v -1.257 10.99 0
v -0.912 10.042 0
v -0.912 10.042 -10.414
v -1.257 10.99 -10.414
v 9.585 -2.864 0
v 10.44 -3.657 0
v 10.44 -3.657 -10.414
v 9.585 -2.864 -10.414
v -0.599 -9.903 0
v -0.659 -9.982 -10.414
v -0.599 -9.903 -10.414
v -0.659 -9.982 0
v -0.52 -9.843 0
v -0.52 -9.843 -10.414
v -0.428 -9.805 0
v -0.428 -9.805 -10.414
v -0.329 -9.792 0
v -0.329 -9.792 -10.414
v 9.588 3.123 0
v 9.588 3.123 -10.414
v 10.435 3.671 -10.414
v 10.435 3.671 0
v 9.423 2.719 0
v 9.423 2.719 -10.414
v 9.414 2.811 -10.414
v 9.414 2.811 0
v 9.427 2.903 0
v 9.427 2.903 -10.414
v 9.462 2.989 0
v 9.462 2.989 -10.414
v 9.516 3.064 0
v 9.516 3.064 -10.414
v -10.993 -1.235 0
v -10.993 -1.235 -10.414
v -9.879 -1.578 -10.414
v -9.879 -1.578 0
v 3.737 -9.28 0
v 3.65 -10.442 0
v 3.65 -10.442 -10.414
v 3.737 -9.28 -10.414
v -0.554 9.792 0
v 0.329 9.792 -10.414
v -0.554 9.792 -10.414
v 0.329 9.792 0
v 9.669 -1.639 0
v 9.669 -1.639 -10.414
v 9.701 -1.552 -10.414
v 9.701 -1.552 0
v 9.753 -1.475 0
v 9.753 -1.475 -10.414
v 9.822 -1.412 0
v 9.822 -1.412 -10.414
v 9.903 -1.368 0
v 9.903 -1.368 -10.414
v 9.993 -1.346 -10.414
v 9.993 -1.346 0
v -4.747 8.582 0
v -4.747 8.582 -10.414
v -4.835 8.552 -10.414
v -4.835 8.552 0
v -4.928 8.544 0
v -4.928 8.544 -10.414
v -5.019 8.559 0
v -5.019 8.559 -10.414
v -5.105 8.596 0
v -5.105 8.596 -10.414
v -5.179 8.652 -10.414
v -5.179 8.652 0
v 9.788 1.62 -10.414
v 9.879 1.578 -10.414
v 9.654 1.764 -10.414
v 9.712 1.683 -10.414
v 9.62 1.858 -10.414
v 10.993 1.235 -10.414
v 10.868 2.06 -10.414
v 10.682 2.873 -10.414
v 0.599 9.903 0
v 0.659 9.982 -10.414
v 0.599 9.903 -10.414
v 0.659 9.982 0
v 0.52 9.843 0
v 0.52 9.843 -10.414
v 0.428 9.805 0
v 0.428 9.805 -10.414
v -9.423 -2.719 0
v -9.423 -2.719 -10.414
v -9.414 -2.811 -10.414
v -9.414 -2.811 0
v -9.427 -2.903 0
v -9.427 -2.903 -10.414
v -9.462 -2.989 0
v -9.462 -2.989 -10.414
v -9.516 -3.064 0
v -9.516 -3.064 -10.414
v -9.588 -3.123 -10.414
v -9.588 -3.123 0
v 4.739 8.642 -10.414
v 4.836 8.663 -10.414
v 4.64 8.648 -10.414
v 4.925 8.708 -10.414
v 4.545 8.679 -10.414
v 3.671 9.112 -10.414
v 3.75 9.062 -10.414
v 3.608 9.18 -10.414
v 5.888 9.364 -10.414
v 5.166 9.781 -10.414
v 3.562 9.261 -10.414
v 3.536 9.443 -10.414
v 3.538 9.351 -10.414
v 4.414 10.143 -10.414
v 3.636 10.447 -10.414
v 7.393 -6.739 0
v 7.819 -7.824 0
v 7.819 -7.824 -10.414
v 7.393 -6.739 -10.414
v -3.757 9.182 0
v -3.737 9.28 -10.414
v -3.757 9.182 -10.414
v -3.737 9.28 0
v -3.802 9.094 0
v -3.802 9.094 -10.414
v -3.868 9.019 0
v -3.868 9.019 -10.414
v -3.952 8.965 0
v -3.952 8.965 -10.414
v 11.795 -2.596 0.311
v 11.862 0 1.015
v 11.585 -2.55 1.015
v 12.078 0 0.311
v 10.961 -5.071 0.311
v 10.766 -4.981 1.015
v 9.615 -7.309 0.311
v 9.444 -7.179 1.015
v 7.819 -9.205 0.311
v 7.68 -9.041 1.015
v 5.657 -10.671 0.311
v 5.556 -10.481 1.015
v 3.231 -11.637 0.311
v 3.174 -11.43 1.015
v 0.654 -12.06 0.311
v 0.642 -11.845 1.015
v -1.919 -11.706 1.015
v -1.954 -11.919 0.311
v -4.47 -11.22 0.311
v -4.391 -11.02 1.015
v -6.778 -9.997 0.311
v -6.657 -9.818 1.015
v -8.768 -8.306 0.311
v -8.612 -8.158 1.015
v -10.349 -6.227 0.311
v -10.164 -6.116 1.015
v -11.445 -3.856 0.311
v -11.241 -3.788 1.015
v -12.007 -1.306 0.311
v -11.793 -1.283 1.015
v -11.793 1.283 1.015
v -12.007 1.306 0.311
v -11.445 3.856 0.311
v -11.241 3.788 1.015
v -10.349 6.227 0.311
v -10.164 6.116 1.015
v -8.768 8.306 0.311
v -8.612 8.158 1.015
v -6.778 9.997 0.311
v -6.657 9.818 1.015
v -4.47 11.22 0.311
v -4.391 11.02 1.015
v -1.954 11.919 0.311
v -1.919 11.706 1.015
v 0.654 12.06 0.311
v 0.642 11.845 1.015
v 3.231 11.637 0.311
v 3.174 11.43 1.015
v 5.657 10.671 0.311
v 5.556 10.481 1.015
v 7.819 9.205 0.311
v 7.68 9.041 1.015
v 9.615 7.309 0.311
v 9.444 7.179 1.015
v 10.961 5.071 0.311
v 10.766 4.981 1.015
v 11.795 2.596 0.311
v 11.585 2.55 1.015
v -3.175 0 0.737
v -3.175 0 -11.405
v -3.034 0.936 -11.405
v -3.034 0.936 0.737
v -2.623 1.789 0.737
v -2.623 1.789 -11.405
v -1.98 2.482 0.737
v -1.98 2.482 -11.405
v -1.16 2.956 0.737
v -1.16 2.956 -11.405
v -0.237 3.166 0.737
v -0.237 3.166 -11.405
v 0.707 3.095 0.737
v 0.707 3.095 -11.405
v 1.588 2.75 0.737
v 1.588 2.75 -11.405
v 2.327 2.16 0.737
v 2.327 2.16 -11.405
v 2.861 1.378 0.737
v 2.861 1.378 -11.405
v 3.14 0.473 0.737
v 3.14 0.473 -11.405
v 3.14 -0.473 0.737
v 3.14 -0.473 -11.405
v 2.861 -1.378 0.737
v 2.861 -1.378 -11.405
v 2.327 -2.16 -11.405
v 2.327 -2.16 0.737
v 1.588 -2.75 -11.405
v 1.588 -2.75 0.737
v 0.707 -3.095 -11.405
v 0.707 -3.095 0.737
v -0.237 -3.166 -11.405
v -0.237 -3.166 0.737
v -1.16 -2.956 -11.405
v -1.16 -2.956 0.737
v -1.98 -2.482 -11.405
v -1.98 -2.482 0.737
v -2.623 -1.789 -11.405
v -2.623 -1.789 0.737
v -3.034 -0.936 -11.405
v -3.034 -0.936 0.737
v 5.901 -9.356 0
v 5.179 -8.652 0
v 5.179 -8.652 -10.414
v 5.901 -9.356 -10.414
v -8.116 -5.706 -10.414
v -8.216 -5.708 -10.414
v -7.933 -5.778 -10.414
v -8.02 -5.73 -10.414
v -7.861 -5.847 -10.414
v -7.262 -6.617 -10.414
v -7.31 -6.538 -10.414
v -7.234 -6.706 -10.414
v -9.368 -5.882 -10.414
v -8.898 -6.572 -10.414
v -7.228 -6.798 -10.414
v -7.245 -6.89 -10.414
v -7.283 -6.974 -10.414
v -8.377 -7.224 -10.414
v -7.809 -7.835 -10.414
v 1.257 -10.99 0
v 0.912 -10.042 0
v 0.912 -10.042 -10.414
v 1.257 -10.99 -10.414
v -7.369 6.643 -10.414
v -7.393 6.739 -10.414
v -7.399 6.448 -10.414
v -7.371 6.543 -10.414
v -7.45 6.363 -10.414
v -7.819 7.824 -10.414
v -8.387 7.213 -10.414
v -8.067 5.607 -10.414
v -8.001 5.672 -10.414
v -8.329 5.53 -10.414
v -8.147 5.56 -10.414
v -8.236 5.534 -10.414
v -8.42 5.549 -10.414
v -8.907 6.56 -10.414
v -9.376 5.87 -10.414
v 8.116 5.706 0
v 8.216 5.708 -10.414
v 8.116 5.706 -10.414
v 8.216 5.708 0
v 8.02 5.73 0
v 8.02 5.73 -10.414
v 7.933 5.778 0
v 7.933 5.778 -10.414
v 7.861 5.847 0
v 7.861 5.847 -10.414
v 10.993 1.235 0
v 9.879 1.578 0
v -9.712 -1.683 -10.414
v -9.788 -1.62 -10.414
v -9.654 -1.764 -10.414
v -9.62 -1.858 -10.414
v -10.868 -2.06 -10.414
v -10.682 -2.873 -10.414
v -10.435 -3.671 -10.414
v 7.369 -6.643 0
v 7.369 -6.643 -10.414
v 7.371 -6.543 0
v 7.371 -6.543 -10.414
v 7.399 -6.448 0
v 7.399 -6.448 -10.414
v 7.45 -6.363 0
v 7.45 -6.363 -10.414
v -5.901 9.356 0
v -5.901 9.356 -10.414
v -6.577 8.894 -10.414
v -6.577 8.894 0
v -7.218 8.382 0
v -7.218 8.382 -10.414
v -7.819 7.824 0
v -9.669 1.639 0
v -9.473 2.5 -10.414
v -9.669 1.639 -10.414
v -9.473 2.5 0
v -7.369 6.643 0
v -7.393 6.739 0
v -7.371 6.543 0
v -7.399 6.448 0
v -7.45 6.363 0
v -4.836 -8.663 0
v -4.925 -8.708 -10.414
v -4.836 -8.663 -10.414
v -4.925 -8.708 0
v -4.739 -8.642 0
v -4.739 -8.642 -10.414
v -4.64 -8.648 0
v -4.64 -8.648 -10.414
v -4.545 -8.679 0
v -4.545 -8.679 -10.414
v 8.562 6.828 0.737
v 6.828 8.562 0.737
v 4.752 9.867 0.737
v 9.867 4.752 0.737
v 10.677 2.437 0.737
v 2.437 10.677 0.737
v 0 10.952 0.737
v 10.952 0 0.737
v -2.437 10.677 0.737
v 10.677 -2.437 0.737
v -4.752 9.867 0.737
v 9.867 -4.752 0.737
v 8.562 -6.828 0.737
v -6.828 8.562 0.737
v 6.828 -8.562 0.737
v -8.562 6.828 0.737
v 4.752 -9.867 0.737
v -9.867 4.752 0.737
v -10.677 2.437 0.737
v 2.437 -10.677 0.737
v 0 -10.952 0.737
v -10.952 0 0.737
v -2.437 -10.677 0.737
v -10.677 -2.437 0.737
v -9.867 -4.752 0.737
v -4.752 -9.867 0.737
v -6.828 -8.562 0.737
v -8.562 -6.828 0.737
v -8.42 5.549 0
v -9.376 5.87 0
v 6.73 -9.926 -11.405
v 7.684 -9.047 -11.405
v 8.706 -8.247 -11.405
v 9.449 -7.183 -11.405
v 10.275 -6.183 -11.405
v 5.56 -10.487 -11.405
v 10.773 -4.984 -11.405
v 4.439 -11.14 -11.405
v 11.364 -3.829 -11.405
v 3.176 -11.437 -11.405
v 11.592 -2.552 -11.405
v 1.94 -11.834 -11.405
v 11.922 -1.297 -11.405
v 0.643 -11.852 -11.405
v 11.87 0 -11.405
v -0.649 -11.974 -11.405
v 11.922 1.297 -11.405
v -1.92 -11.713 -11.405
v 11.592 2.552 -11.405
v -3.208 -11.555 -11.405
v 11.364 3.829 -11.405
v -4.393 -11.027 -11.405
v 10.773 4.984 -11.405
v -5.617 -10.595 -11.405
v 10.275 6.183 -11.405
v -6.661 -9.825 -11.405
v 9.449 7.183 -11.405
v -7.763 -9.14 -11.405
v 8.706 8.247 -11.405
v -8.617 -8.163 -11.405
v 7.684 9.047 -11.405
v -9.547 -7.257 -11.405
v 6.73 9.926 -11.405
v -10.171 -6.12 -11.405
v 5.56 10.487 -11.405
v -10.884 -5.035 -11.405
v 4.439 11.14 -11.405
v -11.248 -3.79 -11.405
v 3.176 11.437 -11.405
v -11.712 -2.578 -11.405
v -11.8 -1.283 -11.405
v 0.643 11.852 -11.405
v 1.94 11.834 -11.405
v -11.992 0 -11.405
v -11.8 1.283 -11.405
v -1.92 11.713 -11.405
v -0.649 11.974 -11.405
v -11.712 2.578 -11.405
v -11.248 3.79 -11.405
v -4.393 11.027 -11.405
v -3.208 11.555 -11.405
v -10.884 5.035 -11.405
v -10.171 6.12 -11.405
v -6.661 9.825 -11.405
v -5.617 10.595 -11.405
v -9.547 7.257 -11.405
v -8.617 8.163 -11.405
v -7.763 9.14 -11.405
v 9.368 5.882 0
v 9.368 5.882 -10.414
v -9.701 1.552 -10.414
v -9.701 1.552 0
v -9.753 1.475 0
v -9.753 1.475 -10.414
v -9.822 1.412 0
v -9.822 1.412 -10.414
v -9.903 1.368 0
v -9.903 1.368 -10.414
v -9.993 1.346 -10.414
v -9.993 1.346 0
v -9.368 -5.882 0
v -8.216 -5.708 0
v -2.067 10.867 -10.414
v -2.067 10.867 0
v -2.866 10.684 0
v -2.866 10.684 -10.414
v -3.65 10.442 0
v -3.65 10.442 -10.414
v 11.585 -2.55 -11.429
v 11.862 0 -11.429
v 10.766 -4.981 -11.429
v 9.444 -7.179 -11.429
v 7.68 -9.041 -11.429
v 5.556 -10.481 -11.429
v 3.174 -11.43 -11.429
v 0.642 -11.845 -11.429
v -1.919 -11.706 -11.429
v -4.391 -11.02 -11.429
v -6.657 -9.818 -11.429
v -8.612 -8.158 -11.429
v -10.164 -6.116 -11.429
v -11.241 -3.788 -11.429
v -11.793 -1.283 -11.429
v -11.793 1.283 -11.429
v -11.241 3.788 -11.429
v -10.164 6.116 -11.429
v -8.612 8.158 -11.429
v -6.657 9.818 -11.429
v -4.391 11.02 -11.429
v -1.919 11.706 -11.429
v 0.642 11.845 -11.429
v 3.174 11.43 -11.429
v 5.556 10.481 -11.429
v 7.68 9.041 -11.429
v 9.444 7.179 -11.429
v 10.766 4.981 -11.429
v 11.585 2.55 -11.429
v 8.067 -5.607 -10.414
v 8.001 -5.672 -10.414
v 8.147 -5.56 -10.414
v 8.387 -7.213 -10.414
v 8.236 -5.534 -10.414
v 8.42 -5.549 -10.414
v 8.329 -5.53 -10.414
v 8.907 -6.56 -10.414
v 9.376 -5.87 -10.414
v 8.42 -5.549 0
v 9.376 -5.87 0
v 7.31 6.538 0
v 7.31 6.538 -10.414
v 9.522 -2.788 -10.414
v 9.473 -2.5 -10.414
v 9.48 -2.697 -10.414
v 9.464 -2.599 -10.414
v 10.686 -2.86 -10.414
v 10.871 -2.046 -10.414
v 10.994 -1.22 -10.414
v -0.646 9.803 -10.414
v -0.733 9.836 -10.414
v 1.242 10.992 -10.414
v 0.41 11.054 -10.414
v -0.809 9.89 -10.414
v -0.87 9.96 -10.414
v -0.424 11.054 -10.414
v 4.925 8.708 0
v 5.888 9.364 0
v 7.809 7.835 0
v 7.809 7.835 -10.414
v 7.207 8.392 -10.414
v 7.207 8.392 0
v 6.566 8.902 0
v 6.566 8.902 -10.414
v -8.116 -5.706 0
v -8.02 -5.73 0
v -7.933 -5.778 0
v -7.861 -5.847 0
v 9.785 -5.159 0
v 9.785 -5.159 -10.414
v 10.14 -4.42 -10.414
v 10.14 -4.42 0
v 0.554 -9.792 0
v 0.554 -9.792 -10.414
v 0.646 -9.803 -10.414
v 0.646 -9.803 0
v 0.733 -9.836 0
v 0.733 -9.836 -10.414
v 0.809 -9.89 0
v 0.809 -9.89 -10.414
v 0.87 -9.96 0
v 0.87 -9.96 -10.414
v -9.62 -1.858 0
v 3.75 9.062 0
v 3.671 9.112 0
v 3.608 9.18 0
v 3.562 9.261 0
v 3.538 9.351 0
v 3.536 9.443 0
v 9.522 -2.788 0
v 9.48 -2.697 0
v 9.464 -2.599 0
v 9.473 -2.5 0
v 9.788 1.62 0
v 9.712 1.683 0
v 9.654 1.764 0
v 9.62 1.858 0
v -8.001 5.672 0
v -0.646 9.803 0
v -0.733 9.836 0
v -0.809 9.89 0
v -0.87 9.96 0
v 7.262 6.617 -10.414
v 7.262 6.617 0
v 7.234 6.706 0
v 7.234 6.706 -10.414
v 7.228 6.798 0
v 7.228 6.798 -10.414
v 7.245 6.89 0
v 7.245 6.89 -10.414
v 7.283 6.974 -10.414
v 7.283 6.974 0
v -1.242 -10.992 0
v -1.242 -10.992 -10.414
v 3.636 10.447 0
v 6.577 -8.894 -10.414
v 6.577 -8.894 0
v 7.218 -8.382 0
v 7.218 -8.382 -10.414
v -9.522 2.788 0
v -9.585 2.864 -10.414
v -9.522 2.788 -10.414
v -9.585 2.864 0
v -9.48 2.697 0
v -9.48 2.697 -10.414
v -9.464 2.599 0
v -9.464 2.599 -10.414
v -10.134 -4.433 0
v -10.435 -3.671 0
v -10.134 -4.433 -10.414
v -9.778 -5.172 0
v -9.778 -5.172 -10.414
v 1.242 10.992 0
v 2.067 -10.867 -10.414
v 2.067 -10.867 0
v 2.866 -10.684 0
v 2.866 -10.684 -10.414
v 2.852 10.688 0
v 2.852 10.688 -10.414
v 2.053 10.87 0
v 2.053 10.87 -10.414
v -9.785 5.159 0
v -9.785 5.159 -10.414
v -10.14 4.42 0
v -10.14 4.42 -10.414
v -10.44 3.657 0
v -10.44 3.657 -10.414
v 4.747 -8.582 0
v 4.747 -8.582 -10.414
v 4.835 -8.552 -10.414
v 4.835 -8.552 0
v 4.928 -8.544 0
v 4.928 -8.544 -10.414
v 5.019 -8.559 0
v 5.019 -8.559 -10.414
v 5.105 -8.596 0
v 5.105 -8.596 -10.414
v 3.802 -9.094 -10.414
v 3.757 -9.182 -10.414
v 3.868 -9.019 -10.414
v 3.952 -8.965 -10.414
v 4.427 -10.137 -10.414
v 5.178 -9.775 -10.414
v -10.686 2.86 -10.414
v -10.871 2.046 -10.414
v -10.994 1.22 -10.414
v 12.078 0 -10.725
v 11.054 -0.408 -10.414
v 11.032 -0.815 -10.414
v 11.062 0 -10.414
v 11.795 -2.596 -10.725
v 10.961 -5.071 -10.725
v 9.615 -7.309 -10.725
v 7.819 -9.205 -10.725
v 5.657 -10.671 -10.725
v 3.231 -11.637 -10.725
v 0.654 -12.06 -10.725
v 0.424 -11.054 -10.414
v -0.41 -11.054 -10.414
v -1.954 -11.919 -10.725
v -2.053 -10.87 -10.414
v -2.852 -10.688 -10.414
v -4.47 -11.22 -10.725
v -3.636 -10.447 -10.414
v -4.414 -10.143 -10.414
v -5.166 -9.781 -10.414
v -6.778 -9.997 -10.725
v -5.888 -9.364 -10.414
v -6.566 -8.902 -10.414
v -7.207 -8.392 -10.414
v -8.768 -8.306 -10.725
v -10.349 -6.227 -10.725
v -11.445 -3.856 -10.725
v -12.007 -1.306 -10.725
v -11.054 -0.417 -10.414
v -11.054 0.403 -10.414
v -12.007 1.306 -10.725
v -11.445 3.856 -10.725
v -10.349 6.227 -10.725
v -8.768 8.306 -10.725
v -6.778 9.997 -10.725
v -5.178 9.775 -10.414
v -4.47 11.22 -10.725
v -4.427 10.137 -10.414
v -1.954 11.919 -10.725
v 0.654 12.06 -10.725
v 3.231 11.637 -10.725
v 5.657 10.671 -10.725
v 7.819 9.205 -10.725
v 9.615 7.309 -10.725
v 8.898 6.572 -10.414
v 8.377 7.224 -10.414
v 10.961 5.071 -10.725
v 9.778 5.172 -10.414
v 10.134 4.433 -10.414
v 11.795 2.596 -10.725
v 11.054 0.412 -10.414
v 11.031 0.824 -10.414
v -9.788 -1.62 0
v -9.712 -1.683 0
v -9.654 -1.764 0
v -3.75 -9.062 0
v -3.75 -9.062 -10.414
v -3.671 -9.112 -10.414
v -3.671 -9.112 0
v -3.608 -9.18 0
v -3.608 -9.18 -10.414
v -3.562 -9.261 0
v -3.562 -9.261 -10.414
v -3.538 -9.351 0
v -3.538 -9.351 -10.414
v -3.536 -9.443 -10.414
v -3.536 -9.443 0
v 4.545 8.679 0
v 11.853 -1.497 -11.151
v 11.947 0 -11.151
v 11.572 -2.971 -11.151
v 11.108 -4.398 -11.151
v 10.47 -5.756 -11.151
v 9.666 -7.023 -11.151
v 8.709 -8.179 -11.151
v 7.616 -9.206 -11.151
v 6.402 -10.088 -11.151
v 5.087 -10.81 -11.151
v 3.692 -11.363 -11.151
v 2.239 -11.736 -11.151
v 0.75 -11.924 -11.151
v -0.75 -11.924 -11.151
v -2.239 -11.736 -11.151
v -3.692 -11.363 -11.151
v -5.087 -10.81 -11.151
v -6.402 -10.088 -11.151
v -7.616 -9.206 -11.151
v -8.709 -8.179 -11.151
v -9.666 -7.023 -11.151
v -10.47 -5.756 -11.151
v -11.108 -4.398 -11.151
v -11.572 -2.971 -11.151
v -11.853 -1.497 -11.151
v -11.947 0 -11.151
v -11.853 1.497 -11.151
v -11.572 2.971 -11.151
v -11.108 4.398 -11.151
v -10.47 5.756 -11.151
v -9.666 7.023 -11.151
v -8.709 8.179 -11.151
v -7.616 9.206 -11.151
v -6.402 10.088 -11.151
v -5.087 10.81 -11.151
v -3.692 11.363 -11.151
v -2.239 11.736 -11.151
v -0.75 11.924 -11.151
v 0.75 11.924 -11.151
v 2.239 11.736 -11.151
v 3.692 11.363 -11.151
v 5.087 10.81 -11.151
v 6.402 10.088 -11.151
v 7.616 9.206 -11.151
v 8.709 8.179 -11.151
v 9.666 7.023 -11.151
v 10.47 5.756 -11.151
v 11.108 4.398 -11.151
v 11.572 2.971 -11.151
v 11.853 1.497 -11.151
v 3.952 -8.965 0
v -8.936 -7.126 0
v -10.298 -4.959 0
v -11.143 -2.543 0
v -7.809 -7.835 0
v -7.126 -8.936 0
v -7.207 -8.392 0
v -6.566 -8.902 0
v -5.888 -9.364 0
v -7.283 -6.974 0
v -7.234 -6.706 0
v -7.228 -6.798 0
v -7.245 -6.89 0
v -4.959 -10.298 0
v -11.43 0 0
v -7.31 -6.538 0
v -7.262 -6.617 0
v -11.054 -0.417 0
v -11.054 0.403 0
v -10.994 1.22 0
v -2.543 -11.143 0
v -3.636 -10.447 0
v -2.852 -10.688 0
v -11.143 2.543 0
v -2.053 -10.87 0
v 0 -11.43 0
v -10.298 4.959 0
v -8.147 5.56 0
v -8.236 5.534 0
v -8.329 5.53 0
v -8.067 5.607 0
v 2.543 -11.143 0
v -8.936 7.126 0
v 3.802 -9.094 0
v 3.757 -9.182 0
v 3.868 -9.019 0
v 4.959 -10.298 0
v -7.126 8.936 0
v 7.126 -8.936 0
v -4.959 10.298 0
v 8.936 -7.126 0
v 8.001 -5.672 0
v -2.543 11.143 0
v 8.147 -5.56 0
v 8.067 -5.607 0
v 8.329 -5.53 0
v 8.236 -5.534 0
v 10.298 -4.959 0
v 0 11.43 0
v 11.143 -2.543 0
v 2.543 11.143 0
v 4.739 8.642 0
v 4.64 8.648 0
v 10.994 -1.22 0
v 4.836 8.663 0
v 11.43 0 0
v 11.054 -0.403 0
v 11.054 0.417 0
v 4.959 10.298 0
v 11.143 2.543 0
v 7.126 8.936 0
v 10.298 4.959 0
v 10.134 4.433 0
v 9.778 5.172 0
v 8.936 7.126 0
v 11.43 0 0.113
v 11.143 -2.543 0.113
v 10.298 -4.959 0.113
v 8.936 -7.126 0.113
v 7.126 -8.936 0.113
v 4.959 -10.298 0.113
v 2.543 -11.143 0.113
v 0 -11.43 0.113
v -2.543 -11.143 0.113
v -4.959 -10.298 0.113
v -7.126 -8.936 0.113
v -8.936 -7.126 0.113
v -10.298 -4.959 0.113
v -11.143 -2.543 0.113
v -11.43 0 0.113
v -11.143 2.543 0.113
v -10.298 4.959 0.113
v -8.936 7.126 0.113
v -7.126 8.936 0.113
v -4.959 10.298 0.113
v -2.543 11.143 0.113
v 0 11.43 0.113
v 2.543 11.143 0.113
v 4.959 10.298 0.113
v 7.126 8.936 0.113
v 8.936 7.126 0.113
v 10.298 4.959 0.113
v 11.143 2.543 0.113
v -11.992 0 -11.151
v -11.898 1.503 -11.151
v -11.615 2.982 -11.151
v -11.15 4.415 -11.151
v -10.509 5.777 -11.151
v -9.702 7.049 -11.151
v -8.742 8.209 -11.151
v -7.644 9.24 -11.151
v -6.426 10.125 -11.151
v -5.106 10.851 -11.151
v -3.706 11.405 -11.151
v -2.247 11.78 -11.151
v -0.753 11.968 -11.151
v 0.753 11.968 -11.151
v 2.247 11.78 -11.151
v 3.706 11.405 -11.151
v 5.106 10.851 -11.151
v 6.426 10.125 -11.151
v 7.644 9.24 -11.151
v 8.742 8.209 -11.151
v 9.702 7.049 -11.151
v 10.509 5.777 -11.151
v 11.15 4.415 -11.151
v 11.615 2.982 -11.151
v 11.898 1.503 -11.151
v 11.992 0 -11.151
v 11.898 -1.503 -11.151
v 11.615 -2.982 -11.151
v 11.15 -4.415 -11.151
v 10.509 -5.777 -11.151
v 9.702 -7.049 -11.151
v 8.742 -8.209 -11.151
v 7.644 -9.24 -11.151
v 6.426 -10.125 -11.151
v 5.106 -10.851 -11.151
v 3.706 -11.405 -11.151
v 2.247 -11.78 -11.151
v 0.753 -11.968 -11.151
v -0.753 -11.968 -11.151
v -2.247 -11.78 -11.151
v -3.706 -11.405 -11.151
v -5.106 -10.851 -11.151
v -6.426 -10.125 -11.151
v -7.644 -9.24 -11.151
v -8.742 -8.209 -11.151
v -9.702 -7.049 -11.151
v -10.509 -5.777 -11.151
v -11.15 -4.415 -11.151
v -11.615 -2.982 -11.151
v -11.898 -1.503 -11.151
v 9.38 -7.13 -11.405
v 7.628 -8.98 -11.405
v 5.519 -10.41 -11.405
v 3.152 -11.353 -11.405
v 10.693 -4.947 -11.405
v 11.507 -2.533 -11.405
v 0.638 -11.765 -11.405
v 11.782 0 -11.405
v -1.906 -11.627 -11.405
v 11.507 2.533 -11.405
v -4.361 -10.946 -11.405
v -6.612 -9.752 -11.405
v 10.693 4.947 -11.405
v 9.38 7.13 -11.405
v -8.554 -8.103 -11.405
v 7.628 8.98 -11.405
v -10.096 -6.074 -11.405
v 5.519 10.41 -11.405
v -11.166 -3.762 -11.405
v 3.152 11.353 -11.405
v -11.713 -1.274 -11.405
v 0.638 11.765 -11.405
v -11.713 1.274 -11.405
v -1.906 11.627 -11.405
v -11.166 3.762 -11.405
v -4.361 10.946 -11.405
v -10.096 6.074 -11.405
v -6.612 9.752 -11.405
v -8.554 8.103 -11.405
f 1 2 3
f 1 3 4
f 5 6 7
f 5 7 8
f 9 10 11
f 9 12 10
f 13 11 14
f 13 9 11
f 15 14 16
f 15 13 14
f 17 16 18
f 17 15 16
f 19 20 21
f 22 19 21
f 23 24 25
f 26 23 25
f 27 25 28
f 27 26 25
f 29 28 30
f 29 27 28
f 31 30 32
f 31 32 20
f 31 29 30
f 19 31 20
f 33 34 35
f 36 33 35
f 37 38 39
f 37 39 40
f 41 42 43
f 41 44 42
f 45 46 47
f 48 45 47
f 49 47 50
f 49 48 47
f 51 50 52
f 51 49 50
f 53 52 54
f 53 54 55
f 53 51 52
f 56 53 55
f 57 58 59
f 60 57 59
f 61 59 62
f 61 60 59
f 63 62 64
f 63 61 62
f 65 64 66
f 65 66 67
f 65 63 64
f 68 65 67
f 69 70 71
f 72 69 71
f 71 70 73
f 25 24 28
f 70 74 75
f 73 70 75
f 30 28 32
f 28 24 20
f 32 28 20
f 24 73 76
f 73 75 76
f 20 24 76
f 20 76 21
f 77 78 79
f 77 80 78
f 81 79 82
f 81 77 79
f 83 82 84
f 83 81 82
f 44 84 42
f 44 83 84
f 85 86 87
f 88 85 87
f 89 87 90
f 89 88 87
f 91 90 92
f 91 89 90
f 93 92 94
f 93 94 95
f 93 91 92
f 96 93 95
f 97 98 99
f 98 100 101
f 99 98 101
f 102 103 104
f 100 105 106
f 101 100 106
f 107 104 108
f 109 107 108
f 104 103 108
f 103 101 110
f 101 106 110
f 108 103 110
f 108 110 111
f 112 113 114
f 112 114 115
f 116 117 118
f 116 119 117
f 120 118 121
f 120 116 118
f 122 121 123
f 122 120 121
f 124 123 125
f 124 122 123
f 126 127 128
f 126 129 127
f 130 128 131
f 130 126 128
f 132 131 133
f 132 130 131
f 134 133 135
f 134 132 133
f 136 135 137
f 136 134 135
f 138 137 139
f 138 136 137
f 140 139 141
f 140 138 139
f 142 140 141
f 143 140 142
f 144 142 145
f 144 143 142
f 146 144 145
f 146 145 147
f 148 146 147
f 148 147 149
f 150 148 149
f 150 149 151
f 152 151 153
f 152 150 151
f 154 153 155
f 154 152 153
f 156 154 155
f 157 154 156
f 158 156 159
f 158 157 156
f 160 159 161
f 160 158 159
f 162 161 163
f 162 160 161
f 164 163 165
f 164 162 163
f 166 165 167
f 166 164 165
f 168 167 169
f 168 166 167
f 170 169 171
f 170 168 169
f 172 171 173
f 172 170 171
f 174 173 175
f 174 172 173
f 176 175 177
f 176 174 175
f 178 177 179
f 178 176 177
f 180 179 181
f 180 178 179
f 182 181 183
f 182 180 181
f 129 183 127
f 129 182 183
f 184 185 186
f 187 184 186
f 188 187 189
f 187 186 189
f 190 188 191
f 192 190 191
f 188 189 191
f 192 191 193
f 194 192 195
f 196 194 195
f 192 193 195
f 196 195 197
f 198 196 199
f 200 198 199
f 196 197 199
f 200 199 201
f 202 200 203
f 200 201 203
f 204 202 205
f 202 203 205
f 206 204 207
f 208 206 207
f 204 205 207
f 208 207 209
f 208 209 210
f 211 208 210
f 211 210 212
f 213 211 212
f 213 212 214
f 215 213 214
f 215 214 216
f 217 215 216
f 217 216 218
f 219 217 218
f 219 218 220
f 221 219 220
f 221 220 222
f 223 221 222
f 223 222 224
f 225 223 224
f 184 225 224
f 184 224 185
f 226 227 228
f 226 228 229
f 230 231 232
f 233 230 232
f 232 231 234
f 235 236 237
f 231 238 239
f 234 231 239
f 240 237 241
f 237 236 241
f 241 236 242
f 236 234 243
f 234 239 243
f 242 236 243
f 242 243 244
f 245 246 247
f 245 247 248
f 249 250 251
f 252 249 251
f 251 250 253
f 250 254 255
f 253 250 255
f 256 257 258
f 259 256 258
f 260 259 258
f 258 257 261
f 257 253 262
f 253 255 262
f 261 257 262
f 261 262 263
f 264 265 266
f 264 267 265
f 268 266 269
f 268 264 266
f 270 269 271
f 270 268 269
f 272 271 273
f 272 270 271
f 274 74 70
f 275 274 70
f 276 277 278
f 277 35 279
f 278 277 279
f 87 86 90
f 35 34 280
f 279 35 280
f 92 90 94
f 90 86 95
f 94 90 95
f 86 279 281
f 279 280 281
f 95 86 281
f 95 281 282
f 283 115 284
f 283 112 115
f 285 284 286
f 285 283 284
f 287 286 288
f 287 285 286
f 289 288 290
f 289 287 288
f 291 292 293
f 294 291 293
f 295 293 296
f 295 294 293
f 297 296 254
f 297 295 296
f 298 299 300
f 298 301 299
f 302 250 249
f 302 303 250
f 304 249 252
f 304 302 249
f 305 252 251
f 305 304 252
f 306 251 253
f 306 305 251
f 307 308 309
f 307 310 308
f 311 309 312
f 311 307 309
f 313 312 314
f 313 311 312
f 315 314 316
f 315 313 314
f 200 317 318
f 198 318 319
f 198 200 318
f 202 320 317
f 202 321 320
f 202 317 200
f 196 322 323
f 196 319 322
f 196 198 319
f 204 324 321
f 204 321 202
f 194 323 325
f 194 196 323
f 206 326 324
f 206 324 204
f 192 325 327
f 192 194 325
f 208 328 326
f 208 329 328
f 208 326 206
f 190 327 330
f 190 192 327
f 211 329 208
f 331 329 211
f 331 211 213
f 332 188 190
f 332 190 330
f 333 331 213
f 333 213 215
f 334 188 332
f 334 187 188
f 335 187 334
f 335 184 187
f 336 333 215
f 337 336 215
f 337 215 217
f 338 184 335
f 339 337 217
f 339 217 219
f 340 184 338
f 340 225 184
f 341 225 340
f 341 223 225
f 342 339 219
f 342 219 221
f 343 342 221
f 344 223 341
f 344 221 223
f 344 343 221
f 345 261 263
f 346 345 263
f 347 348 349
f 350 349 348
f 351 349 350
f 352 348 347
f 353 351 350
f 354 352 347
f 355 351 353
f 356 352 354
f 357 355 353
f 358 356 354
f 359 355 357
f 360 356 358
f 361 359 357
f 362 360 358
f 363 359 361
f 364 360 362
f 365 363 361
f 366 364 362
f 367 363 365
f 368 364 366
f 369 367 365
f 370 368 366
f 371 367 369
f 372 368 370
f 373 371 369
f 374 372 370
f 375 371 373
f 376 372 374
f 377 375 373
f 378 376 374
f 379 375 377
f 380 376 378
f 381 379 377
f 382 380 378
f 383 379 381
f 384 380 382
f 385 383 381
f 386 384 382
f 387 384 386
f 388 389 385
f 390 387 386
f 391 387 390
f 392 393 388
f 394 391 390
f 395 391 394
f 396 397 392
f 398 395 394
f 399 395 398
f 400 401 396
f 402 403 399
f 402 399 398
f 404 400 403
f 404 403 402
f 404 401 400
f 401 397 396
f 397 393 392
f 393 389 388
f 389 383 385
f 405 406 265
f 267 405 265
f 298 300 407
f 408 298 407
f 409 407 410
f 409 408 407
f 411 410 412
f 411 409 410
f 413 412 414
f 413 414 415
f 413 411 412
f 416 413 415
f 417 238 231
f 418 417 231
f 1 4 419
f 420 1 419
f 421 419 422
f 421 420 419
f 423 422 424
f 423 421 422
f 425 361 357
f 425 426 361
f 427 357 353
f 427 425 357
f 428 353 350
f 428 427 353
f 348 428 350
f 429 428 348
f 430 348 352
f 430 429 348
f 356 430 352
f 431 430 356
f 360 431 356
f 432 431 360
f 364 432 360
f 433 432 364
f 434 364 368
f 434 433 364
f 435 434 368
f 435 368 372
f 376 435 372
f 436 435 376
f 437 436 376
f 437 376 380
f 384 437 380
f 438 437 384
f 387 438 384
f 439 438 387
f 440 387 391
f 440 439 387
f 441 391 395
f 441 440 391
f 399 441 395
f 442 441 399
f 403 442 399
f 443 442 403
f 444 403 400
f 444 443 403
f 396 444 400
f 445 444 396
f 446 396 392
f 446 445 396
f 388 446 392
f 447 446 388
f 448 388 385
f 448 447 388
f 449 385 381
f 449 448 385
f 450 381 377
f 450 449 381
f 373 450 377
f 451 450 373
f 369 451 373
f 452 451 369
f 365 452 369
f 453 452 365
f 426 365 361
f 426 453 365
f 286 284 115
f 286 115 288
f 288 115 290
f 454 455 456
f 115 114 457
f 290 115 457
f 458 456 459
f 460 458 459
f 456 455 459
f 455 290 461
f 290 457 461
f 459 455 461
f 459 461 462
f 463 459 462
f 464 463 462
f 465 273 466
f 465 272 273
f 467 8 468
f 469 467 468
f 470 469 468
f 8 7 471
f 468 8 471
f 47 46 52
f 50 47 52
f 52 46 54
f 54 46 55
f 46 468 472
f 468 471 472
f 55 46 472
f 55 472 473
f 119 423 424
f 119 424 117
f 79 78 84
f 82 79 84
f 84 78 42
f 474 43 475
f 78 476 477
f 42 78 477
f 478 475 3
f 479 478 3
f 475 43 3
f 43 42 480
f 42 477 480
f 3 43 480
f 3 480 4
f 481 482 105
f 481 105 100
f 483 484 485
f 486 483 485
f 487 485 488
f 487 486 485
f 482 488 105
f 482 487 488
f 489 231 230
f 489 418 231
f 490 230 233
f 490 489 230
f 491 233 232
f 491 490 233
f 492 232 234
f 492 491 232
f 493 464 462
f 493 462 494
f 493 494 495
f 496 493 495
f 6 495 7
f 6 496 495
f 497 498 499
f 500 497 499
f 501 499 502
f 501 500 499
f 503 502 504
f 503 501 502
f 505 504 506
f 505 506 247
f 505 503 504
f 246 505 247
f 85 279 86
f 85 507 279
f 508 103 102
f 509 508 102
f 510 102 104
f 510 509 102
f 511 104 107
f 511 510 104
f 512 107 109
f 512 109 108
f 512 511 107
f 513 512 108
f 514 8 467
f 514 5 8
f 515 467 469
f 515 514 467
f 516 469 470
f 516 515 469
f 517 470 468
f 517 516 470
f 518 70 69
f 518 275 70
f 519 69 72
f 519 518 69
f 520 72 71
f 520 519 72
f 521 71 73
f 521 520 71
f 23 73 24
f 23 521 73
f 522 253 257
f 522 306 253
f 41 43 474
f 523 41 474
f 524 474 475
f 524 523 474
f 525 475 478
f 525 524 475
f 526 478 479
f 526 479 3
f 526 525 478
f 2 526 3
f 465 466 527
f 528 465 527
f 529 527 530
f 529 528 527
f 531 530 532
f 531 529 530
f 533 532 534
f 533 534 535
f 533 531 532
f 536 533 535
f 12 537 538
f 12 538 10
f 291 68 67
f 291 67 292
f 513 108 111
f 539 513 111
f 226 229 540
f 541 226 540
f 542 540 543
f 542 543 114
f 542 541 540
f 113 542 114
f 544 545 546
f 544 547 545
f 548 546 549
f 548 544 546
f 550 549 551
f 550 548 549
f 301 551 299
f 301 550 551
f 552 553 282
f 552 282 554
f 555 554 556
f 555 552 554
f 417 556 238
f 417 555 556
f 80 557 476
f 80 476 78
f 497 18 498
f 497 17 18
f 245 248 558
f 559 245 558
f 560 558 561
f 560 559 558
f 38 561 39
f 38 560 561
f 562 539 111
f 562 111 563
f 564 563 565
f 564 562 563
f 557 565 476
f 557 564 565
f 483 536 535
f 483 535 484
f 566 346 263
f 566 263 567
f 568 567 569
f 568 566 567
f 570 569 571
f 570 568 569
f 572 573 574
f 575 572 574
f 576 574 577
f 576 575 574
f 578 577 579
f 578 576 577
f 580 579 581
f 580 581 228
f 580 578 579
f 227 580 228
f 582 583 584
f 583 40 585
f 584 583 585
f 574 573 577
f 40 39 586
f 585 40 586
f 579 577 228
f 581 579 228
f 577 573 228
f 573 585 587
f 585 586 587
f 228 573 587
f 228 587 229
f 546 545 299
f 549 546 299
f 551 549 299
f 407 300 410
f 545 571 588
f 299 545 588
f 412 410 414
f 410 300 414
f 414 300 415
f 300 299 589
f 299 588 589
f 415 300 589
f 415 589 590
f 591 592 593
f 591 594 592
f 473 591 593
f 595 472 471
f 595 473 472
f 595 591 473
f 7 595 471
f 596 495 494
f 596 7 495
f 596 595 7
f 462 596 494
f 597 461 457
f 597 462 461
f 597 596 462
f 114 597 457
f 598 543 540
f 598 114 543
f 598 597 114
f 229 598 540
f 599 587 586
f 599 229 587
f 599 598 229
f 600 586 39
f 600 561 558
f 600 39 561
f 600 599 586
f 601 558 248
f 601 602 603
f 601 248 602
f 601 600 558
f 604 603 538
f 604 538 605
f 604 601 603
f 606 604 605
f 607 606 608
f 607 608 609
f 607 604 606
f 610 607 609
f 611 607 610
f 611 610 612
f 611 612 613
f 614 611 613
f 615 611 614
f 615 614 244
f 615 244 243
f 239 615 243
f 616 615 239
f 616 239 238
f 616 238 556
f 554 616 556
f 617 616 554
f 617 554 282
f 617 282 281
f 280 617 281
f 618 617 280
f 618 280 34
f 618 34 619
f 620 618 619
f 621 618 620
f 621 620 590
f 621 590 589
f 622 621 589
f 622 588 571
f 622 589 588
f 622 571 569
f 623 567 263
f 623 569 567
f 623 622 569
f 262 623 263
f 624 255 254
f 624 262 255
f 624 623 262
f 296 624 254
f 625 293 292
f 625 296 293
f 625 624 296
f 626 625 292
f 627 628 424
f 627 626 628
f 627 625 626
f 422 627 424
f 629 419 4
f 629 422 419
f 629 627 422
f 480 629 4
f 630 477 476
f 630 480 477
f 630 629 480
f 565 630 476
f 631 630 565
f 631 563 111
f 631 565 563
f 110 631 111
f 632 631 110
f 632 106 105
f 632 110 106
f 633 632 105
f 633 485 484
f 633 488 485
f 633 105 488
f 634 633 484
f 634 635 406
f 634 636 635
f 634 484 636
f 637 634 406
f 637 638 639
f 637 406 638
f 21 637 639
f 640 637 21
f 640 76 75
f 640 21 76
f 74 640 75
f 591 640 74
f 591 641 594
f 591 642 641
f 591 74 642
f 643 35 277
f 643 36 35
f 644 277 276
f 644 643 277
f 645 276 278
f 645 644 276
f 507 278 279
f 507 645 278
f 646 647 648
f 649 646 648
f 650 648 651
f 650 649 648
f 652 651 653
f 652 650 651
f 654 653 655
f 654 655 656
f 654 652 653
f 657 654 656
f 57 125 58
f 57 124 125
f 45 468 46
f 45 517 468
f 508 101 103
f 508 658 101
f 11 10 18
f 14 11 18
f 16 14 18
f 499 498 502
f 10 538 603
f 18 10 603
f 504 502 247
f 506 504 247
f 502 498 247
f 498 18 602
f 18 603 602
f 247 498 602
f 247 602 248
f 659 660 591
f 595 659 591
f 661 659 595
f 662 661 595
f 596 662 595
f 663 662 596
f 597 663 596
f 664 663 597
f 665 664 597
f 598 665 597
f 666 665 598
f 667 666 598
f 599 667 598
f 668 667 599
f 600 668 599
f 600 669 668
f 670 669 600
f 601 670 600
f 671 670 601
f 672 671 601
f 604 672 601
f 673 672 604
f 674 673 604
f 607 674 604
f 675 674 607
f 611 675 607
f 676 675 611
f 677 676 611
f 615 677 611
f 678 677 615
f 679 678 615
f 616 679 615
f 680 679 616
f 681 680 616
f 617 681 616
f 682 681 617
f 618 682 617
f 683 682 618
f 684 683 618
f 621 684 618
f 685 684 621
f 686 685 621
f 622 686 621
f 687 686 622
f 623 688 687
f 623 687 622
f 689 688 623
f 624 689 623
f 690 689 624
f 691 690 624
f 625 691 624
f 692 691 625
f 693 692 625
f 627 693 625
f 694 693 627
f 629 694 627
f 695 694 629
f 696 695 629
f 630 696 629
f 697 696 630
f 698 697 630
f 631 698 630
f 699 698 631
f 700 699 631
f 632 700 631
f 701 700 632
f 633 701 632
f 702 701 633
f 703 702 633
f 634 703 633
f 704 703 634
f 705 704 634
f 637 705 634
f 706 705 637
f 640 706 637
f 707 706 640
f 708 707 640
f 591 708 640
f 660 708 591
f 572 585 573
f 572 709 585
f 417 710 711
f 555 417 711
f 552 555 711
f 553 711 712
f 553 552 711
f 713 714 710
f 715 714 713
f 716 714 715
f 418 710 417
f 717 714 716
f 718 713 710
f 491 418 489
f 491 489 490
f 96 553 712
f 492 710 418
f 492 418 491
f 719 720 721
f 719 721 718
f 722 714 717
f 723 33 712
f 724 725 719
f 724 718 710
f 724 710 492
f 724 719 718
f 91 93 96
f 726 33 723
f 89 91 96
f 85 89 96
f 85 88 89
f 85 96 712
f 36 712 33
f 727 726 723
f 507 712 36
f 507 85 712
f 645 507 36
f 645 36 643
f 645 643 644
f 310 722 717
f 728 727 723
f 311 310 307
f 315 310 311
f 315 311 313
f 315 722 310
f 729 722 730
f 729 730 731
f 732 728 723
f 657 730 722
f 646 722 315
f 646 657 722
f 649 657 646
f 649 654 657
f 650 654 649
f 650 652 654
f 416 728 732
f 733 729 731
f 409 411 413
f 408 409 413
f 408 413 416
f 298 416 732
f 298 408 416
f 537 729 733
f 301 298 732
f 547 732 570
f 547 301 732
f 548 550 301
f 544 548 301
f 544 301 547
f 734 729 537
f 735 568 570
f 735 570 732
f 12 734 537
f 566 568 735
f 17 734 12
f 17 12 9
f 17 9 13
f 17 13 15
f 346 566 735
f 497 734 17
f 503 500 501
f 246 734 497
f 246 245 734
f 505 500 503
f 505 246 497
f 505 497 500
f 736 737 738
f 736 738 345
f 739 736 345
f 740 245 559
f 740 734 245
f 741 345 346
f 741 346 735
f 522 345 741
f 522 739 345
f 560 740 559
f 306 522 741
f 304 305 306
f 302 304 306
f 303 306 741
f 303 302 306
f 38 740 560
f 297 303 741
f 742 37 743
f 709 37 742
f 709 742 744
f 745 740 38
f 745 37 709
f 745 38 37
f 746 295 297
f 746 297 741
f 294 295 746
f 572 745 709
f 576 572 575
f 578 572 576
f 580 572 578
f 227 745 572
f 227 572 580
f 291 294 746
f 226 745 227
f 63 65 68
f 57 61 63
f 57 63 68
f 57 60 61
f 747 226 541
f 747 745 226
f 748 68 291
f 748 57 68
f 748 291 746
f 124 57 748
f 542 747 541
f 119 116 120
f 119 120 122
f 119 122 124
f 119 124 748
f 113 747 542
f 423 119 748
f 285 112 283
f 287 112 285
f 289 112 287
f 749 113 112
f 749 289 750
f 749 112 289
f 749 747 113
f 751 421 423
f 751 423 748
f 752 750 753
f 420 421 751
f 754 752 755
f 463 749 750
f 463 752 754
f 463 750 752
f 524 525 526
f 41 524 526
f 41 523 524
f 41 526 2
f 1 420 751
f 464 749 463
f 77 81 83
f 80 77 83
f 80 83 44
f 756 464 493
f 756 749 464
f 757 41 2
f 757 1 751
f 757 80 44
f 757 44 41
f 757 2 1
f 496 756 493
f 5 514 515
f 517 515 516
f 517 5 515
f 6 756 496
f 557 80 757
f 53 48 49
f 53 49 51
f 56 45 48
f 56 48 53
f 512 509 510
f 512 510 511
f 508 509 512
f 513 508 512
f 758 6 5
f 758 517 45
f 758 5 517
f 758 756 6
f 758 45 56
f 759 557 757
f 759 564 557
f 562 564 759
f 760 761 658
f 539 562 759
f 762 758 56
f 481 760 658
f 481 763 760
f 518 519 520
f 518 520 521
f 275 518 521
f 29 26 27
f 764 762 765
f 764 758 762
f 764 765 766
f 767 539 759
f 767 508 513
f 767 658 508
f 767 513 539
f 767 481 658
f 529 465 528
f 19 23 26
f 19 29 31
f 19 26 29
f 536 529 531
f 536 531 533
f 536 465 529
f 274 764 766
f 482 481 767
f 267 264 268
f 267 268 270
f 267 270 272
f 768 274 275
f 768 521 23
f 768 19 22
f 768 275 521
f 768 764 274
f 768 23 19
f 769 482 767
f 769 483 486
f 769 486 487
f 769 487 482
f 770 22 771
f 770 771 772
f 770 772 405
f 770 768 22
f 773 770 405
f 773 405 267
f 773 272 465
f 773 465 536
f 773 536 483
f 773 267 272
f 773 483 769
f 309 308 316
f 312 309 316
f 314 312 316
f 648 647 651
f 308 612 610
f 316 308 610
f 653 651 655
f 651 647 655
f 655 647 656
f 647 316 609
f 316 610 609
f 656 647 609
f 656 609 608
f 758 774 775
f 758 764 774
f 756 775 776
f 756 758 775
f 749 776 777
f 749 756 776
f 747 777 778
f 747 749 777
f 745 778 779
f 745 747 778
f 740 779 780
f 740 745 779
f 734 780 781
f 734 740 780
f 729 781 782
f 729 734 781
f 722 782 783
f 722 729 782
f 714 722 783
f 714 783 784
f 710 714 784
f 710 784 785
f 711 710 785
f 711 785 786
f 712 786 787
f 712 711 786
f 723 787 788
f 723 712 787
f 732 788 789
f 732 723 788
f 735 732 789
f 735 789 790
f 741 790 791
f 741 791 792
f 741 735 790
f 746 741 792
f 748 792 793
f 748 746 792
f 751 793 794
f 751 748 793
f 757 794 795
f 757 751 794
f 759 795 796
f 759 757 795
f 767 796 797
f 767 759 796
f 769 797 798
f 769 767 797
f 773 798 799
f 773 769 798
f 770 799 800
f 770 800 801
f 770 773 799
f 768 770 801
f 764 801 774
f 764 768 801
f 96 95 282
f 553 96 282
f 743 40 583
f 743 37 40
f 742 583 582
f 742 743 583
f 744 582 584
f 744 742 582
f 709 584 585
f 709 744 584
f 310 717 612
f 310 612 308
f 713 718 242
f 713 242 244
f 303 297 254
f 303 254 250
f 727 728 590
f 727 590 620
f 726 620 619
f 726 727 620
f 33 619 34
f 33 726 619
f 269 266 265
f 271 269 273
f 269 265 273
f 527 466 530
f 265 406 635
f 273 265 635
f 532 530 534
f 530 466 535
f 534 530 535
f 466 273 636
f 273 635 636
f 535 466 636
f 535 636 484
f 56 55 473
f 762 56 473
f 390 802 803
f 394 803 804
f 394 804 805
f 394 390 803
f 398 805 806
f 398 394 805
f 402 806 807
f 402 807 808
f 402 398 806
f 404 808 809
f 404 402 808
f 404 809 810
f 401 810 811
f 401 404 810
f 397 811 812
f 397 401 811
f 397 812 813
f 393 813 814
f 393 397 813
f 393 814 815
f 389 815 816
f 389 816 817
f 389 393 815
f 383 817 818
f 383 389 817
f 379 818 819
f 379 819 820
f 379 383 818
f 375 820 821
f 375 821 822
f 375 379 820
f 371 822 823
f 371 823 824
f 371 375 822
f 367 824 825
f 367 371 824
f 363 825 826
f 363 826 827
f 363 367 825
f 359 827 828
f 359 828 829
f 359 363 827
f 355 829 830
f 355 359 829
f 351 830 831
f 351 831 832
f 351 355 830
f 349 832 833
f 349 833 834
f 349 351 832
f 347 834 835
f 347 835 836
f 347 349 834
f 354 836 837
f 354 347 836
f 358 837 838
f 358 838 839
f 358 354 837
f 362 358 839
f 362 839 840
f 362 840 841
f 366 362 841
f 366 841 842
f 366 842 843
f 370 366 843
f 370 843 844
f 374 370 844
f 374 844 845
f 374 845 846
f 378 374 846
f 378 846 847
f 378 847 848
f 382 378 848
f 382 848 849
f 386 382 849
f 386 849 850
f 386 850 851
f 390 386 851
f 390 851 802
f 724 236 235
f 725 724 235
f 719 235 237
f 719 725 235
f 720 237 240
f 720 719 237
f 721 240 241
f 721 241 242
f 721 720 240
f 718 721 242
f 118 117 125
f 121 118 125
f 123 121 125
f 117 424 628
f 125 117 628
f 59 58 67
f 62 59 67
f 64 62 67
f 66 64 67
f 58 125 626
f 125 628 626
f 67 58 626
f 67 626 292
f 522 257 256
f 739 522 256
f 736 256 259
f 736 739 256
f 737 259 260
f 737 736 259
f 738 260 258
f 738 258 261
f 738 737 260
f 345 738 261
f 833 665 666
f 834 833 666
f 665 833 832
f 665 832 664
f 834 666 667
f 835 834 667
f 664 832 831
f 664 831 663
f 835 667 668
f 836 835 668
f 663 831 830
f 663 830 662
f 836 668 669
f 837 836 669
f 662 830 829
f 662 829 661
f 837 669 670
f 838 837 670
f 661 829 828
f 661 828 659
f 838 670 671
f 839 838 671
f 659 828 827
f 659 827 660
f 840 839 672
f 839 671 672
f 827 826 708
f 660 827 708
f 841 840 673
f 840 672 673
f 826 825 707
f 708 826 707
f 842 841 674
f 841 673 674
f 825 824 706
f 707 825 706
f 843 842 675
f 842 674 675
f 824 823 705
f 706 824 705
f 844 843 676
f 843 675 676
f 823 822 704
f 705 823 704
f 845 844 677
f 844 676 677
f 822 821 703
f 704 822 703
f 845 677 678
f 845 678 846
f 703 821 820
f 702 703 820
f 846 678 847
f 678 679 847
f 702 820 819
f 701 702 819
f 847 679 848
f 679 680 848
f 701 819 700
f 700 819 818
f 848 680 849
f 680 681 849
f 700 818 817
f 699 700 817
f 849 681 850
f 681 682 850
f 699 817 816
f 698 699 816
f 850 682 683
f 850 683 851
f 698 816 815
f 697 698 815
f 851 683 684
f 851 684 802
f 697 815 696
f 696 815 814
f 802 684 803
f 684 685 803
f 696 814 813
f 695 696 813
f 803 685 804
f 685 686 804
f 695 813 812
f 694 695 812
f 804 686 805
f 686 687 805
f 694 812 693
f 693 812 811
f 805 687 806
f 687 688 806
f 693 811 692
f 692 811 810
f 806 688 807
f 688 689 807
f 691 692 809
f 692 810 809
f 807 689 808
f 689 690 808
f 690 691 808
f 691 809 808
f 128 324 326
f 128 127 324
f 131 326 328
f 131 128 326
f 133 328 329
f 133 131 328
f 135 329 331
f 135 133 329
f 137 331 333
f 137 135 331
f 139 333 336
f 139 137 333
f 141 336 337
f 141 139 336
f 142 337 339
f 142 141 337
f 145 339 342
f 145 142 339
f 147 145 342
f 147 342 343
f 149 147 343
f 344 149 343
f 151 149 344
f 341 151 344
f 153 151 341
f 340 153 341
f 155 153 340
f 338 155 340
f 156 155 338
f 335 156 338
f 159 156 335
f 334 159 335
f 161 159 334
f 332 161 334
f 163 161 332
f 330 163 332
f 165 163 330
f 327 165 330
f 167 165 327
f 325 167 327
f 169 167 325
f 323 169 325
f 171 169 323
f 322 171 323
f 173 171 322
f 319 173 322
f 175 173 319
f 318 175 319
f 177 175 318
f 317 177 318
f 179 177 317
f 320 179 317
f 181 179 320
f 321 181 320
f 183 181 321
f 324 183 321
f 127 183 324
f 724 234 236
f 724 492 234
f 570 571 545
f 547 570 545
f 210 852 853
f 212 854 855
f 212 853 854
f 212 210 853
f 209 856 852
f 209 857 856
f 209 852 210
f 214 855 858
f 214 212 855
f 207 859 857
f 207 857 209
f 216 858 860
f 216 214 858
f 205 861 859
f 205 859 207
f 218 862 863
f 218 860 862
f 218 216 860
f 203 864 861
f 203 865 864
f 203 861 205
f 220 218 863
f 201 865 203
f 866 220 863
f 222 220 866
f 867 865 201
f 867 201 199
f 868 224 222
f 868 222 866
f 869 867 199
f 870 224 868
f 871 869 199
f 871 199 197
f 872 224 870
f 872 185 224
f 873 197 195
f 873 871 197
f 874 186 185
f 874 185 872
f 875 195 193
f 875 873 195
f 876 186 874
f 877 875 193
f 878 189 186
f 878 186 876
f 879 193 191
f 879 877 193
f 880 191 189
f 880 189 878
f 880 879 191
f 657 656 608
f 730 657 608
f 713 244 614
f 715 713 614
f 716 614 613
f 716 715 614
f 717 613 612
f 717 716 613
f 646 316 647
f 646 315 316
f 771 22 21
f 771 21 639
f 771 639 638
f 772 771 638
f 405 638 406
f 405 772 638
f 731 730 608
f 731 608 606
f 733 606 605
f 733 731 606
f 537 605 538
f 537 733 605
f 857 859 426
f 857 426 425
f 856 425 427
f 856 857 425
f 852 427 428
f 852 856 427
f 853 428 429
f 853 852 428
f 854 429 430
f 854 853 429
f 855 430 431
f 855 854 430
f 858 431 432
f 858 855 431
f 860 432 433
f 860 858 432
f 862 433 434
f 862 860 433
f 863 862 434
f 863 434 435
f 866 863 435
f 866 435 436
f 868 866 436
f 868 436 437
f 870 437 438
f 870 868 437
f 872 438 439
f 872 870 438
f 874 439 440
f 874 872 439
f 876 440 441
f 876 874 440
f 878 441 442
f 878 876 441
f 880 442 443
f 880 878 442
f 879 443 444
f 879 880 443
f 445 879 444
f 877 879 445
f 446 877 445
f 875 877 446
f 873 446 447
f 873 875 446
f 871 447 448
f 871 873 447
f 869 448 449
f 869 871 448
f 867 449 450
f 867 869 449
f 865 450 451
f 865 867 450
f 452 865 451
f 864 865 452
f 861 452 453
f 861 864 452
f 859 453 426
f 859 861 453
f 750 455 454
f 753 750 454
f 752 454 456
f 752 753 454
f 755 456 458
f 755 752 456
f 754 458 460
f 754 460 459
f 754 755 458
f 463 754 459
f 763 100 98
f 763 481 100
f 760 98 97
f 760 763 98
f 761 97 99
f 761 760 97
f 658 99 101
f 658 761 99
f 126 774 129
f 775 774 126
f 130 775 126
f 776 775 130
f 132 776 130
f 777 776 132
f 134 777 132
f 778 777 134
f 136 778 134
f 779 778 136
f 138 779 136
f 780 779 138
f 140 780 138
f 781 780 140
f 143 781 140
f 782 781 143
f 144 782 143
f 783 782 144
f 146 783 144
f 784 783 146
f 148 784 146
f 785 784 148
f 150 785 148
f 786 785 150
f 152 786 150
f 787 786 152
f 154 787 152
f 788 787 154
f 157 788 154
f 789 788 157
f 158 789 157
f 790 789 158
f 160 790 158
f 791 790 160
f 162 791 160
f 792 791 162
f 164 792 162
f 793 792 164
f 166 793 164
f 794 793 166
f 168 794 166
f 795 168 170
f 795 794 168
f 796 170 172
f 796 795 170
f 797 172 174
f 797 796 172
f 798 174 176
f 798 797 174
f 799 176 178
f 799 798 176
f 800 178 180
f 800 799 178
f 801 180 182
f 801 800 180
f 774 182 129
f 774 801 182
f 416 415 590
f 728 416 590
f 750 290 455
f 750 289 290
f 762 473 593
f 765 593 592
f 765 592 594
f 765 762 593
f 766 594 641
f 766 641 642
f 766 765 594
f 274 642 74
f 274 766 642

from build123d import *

# Parameters (mm, degrees)
SKETCH1_R           = 11.0617
BASEPULLEY_DEPTH    = 10.414
GROOVE_DEPTH        = 5.207
GROOVES_COUNT       = 14
GROOVES_ANGLE       = 334.285714286
SKETCH4_W           = 0.254
SKETCH4_H           = 11.43
BORSKE_R            = 3.175
BORE_DEPTH          = 21.970083094
BOSS_EXTRUDE1_START = 0.254
SKETCH7_R           = 11.992065176
SKETCH7_R_2         = 3.175
BOSS_EXTRUDE1_DEPTH = 0.254


with BuildPart() as part:
    # Sketch1 → BasePulley (new body)
    with BuildSketch(Plane.XY):
        Circle(SKETCH1_R)
    extrude(amount=-BASEPULLEY_DEPTH)

    # Sketch2 → Flange (revolve)
    with BuildSketch(Plane(origin=(0, 0, 0), x_dir=(0, 0, -1), z_dir=(1, 0, 0)), mode=Mode.PRIVATE) as flange_sk:
        Polygon((10.414, 11.0617), (10.724622372, 12.0777), (11.429036456, 11.862339002), (11.1506, 10.951614392), (11.1506, 0), (-0.7366, 0), (-0.7366, 10.951614392), (-1.015036456, 11.862339002), (-0.310622372, 12.0777), (0, 11.0617), align=None)
    revolve(flange_sk.sketch.rotate(Axis((0, 0, 0), (0, 0, -1)), 90), axis=Axis((0, 0, 0), (0, 0, -1)))

    # Sketch3 → Groove (cut, symmetric)
    with BuildSketch(Plane.XY.offset(-5.207)):
        with BuildLine():
            Line((-1.2827, 11.0617), (-1.2827, 36.4617))
            Line((-1.2827, 36.4617), (1.2827, 36.4617))
            Line((1.2827, 36.4617), (1.2827, 11.0617))
            Line((1.2827, 11.0617), (0.659450384, 9.9822))
            ThreePointArc((0.659450384, 9.9822), (0.519994706, 9.842744321), (0.329494706, 9.7917))
            Line((0.329494706, 9.7917), (-0.55367873, 9.7917))
            ThreePointArc((-0.55367873, 9.7917), (-0.772211353, 9.860603071), (-0.911701619, 10.042390325))
            Line((-0.911701619, 10.042390325), (-1.2827, 11.0617))
        make_face()
    groove = extrude(amount=GROOVE_DEPTH, both=True, mode=Mode.SUBTRACT)

    # Grooves: Groove ×14 about axis
    grooves_axis = Axis((0, 0, -10.414), (0, 0, 1))
    for i in range(1, GROOVES_COUNT):
        add(groove.rotate(grooves_axis, i * GROOVES_ANGLE / (GROOVES_COUNT - 1)), mode=Mode.SUBTRACT)

    # Sketch4 → BaseHub (revolve)
    with BuildSketch(Plane(origin=(0, 0, 0), x_dir=(0, 0, -1), z_dir=(1, 0, 0)), mode=Mode.PRIVATE) as basehub_sk:
        with Locations((-0.127, 5.715)):
            Rectangle(SKETCH4_W, SKETCH4_H)
    revolve(basehub_sk.sketch.rotate(Axis((0, 0, 0), (0, 0, -1)), 90), axis=Axis((0, 0, 0), (0, 0, -1)))

    # BorSke → Bore (cut, through all)
    with BuildSketch(Plane(origin=(0, 0, -11.1506), x_dir=(-1, 0, 0), z_dir=(0, 0, -1))):
        Circle(BORSKE_R)
    extrude(amount=-BORE_DEPTH, mode=Mode.SUBTRACT)

    # Sketch7 → Boss-Extrude1 (add)
    with BuildSketch(Plane(origin=(0, 0, -11.1506), x_dir=(-1, 0, 0), z_dir=(0, 0, -1)).offset(BOSS_EXTRUDE1_START)):
        Circle(SKETCH7_R)
        Circle(SKETCH7_R_2, mode=Mode.SUBTRACT)
    extrude(amount=-BOSS_EXTRUDE1_DEPTH)


solid = part.part
